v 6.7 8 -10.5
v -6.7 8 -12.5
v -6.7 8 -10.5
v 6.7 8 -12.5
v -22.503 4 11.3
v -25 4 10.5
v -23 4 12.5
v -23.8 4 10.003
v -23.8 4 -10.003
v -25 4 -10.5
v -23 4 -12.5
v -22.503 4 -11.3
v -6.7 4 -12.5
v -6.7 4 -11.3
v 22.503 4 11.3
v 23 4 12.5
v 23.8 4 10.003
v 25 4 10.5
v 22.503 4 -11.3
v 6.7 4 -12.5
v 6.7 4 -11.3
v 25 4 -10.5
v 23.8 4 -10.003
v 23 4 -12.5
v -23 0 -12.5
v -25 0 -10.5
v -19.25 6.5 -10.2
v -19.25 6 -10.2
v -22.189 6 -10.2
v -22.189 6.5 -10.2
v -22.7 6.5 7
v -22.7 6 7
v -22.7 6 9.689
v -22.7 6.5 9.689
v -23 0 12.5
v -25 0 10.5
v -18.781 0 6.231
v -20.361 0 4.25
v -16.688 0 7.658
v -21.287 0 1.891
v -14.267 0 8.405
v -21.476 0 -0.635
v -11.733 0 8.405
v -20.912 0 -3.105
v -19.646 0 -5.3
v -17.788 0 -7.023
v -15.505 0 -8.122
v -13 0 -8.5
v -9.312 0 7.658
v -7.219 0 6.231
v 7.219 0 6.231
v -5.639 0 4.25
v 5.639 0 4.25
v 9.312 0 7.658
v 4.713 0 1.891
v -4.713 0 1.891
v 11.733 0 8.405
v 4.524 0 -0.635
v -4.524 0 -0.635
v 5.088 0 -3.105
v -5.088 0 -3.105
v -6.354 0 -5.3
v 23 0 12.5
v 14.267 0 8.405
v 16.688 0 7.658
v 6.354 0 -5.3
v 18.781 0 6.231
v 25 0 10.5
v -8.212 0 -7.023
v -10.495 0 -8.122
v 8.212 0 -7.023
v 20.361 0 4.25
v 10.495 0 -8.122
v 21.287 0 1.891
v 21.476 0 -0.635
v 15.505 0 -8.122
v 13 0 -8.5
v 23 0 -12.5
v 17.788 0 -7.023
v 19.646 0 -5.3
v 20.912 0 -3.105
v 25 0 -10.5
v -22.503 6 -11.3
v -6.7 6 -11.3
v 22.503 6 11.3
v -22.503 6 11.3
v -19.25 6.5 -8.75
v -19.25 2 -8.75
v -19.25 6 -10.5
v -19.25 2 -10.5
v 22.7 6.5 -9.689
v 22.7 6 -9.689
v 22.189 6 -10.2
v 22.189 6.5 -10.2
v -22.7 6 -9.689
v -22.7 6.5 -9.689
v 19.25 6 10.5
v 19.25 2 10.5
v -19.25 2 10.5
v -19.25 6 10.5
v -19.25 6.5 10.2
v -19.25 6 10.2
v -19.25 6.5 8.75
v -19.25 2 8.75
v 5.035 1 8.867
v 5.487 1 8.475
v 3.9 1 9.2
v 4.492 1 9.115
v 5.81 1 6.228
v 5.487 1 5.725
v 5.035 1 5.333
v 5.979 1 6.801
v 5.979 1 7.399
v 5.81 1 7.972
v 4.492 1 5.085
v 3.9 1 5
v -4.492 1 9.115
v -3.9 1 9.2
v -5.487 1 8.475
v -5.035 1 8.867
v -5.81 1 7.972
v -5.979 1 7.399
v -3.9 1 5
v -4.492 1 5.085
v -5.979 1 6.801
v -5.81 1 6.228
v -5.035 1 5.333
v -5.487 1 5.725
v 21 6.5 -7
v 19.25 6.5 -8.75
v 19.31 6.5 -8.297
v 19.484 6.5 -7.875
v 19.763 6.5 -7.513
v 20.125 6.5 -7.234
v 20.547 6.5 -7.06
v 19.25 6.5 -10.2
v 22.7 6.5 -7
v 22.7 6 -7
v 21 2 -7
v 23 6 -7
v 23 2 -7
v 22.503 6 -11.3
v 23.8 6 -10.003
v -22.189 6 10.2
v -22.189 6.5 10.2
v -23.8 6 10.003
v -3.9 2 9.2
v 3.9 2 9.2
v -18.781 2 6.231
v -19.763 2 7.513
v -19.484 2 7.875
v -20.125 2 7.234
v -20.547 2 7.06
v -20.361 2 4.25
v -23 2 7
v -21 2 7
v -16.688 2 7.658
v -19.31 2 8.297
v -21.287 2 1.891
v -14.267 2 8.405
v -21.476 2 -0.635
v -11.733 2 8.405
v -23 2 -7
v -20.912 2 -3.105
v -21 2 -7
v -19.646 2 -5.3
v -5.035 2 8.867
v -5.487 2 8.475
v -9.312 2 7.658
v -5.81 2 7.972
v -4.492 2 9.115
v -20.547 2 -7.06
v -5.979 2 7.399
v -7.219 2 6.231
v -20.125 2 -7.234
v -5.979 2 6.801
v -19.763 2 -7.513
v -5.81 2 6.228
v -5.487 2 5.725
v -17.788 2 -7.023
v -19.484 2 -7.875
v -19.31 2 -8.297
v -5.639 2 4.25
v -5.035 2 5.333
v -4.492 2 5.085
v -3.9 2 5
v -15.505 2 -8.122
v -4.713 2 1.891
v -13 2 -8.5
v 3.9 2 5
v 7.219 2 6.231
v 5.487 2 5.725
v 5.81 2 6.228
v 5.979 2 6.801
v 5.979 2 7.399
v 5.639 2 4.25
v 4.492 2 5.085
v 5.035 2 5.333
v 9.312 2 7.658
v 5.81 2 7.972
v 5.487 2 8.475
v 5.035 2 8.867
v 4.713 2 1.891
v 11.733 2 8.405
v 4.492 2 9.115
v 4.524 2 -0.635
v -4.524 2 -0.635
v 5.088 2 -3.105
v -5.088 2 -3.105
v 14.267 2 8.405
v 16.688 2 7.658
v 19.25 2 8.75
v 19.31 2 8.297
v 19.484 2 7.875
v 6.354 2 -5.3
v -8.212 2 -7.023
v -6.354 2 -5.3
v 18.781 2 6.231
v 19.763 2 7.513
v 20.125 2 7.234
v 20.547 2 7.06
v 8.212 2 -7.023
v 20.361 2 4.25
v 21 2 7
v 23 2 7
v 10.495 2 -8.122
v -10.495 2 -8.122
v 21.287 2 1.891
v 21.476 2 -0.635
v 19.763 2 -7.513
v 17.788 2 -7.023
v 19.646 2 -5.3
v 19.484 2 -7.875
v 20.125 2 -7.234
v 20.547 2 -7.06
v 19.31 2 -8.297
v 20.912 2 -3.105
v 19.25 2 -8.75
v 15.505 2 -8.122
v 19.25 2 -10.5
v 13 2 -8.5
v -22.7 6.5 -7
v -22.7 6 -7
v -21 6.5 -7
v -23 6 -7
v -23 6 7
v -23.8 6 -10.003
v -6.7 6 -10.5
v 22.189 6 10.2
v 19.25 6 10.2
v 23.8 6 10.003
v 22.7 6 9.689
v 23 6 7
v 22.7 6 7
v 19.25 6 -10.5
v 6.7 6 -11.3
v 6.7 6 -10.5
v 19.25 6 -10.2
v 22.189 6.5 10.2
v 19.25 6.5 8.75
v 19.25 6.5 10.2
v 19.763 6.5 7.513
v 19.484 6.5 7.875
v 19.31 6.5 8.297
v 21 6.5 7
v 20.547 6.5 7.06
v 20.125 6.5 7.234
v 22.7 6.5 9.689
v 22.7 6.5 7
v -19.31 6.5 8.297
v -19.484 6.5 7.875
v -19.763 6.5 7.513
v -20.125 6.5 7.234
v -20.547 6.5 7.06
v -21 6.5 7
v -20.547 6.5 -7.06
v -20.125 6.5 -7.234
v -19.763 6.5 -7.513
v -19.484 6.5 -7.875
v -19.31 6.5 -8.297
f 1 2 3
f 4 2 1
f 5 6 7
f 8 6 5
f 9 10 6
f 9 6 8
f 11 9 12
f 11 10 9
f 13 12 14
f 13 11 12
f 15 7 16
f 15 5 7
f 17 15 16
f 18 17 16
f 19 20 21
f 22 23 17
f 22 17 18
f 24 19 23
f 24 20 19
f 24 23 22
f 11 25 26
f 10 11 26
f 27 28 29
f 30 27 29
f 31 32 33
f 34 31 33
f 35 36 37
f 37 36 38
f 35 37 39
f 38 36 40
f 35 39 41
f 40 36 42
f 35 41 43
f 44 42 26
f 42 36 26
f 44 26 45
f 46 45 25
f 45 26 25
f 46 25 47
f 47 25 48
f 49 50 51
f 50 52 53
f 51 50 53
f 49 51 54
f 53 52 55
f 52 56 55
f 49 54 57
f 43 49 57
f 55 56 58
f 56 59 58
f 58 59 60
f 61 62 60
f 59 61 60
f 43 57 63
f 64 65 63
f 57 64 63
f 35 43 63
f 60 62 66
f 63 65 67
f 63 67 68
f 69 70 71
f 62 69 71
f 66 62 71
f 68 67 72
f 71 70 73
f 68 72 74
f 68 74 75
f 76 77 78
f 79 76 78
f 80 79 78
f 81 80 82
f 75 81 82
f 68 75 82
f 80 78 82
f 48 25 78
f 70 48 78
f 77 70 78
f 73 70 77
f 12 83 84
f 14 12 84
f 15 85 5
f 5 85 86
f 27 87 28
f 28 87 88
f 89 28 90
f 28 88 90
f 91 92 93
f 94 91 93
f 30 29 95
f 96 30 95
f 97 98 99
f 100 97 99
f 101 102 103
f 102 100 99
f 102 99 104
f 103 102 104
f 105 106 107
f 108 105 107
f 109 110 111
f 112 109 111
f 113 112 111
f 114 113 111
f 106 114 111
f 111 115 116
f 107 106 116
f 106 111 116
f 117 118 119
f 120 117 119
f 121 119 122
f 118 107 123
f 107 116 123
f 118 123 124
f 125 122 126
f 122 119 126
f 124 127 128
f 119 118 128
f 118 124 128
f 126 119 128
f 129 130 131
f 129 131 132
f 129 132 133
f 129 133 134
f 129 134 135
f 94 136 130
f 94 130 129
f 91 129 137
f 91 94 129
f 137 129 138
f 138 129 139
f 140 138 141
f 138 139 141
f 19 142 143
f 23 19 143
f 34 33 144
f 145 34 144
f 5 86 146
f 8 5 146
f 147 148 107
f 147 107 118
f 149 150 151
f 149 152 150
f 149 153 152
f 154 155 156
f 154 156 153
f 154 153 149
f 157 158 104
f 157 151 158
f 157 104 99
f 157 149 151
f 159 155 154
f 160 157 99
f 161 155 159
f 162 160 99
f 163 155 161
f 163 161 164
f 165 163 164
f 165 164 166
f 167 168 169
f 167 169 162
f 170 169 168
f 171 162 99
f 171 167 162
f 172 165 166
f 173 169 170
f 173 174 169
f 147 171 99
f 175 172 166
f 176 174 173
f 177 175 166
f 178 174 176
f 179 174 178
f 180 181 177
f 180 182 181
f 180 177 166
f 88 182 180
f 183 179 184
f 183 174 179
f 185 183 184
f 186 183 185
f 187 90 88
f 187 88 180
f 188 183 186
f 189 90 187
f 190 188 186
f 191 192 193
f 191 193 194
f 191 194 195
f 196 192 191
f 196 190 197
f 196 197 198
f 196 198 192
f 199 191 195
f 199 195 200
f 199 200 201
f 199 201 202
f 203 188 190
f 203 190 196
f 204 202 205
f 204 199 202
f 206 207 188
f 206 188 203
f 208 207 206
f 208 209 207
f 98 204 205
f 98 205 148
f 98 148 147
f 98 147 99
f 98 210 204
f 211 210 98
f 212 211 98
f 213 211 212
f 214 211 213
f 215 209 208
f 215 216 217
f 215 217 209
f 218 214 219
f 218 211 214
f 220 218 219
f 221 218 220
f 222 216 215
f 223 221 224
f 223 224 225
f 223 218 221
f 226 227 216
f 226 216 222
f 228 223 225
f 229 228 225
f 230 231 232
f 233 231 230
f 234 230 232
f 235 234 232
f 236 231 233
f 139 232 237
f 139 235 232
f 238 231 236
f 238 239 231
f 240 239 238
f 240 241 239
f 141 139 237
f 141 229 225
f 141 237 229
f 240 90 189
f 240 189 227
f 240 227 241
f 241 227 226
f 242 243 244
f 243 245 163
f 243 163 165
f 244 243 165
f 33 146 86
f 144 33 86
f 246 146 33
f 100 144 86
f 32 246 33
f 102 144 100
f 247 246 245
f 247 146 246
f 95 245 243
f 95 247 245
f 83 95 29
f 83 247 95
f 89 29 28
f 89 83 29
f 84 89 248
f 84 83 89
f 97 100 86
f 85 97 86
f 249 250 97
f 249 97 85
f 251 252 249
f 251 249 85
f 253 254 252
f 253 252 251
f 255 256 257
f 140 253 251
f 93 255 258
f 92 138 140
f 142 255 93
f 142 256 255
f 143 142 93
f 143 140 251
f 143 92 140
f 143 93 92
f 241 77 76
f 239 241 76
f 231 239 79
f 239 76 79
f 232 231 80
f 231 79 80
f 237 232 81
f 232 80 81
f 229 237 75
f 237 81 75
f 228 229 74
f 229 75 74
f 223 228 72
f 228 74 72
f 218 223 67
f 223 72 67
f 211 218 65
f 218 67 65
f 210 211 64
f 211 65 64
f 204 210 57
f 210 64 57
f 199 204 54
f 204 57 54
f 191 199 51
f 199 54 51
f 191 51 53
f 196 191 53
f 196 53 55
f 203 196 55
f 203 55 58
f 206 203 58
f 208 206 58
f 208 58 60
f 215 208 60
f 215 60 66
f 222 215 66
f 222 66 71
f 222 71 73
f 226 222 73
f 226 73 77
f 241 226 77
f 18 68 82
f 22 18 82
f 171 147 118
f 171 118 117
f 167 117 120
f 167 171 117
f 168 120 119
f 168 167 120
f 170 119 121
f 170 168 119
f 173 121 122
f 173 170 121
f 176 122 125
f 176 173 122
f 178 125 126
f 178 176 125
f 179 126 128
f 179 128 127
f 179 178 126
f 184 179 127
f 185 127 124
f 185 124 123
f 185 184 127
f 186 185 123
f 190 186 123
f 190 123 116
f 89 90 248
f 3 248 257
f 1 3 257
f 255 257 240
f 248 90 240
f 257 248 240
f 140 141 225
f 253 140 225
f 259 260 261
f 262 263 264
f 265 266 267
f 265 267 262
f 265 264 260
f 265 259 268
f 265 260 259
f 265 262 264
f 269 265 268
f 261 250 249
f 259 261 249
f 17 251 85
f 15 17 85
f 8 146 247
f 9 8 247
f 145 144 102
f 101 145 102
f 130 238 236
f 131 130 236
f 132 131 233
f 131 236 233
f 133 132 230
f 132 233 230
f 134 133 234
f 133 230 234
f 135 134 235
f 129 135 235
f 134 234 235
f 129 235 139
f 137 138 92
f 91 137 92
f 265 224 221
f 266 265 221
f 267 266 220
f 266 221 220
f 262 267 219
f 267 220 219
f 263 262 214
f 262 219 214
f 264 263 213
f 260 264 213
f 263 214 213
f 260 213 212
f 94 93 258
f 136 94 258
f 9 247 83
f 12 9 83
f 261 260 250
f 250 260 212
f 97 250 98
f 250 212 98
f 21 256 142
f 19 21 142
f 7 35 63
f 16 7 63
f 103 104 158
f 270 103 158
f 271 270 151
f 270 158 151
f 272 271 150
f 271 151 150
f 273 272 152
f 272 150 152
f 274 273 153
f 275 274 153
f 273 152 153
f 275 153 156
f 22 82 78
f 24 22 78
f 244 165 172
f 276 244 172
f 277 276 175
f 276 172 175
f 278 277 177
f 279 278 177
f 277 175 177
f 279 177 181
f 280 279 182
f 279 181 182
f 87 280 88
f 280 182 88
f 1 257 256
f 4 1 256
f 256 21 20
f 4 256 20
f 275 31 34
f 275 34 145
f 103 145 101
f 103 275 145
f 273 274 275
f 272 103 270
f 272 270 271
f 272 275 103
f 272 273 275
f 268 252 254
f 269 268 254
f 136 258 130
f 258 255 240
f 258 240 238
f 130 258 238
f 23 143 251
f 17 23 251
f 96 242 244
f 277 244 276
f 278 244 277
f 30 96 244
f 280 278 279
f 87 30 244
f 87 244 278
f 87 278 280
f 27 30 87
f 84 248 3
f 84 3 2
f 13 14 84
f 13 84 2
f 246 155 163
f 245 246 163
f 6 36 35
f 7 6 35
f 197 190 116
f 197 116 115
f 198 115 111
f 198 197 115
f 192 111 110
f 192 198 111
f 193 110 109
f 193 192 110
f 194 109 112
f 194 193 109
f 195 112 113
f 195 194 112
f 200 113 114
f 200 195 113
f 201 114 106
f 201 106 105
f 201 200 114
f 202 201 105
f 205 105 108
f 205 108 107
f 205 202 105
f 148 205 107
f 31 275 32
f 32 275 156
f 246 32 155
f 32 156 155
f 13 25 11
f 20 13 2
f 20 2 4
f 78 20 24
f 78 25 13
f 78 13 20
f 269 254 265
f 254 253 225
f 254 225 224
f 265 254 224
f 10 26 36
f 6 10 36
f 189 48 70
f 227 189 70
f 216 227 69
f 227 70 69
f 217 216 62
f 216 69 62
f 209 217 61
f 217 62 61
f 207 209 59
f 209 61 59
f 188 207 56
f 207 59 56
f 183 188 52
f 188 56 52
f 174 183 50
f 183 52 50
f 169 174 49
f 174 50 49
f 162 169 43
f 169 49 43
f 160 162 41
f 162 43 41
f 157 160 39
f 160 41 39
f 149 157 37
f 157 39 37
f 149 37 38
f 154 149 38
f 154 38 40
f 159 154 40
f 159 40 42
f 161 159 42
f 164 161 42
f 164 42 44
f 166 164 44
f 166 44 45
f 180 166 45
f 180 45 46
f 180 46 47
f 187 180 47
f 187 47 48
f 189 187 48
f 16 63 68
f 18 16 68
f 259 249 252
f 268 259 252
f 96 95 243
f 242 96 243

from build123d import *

# Parameters (mm, degrees)
BOSS_EXTRUDE1_DEPTH = 2
BOSS_EXTRUDE2_DEPTH = 4
BOSS_EXTRUDE3_DEPTH = 4
SKETCH3_R           = 8.5
FORSENSORS_DEPTH    = 5
FORCRYSTAL_DEPTH    = 1
PCBLEDGE_DEPTH      = 0.5
GROOVE_DEPTH        = 2
SKETCH7_W           = 13.4
SKETCH7_H           = 2
BOSS_EXTRUDE5_DEPTH = 2


with BuildPart() as part:
    # Sketch1 → Boss-Extrude1 (new body)
    with BuildSketch(Plane(origin=(0, 0, 0), x_dir=(1, 0, 0), z_dir=(0, 1, 0))):
        Polygon((7, 12.5), (-23, 12.5), (-25, 10.5), (-25, -10.5), (-23, -12.5), (23, -12.5), (25, -10.5), (25, 10.5), (23, 12.5), align=None)
    extrude(amount=BOSS_EXTRUDE1_DEPTH)

    # Sketch2 → Boss-Extrude2 (add)
    with BuildSketch(Plane(origin=(0, 2, 0), x_dir=(1, 0, 0), z_dir=(0, 1, 0))):
        with BuildLine():
            Line((-19.25, 8.75), (-19.25, 10.5))
            Line((-19.25, 10.5), (-22.171572875, 10.5))
            Line((-22.171572875, 10.5), (-23, 9.671572875))
            Line((-23, 9.671572875), (-23, 7))
            Line((-23, 7), (-21, 7))
            ThreePointArc((-21, 7), (-19.762563133, 7.512563133), (-19.25, 8.75))
        make_face()
        with BuildLine():
            Line((22.171572875, 10.5), (19.25, 10.5))
            Line((19.25, 10.5), (19.25, 8.75))
            ThreePointArc((19.25, 8.75), (19.762563133, 7.512563133), (21, 7))
            Line((21, 7), (23, 7))
            Line((23, 7), (23, 9.671572875))
            Line((23, 9.671572875), (22.171572875, 10.5))
        make_face()
        with BuildLine():
            Line((-21, -7), (-23, -7))
            Line((-23, -7), (-23, -9.671572875))
            Line((-23, -9.671572875), (-22.171572875, -10.5))
            Line((-22.171572875, -10.5), (-19.25, -10.5))
            Line((-19.25, -10.5), (-19.25, -8.75))
            ThreePointArc((-19.25, -8.75), (-19.762563133, -7.512563133), (-21, -7))
        make_face()
        with BuildLine():
            Line((23, -9.671572875), (23, -7))
            Line((23, -7), (21, -7))
            ThreePointArc((21, -7), (19.762563133, -7.512563133), (19.25, -8.75))
            Line((19.25, -8.75), (19.25, -10.5))
            Line((19.25, -10.5), (22.171572875, -10.5))
            Line((22.171572875, -10.5), (23, -9.671572875))
        make_face()
    extrude(amount=BOSS_EXTRUDE2_DEPTH)

    # Sketch2<3> → Boss-Extrude3 (add)
    with BuildSketch(Plane(origin=(0, 2, 0), x_dir=(1, 0, 0), z_dir=(0, 1, 0))):
        Polygon((23, 12.5), (7.5, 12.5), (-7.5, 12.5), (-23, 12.5), (-25, 10.5), (-25, -10.5), (-23, -12.5), (0, -12.5), (23, -12.5), (25, -10.5), (25, 10.5), align=None)
        Polygon((-19.25, 10.5), (-1.449649569, 10.5), (1.449649569, 10.5), (19.25, 10.5), (22.171572875, 10.5), (23, 9.671572875), (23, 7), (23, -7), (23, -9.671572875), (22.171572875, -10.5), (19.25, -10.5), (0, -10.5), (-19.25, -10.5), (-22.171572875, -10.5), (-23, -9.671572875), (-23, -7), (-23, 7), (-23, 9.671572875), (-22.171572875, 10.5), align=None, mode=Mode.SUBTRACT)
    extrude(amount=BOSS_EXTRUDE3_DEPTH)

    # Sketch3 → ForSensors (cut)
    with BuildSketch(Plane.XZ):
        with Locations((-13, 0)):
            Circle(SKETCH3_R)
        with Locations((13, 0)):
            Circle(SKETCH3_R)
    extrude(amount=-FORSENSORS_DEPTH, mode=Mode.SUBTRACT)

    # Sketch4 → ForCrystal (cut)
    with BuildSketch(Plane(origin=(0, 2, 0), x_dir=(1, 0, 0), z_dir=(0, 1, 0))):
        with BuildLine():
            Line((3.9, -9.2), (-3.9, -9.2))
            ThreePointArc((-3.9, -9.2), (-6, -7.1), (-3.9, -5))
            Line((-3.9, -5), (3.9, -5))
            ThreePointArc((3.9, -5), (6, -7.1), (3.9, -9.2))
        make_face()
    extrude(amount=-FORCRYSTAL_DEPTH, mode=Mode.SUBTRACT)

    # Sketch5 → PcbLedge (add)
    with BuildSketch(Plane(origin=(0, 6, 0), x_dir=(1, 0, 0), z_dir=(0, 1, 0))):
        with BuildLine():
            ThreePointArc((19.25, 8.75), (19.762563133, 7.512563133), (21, 7))
            Line((21, 7), (22.7, 7))
            Line((22.7, 7), (22.7, 9.688730163))
            Line((22.7, 9.688730163), (22.188730163, 10.2))
            Line((22.188730163, 10.2), (19.25, 10.2))
            Line((19.25, 10.2), (19.25, 8.75))
        make_face()
        with BuildLine():
            Line((22.7, -7), (21, -7))
            ThreePointArc((21, -7), (19.762563133, -7.512563133), (19.25, -8.75))
            Line((19.25, -8.75), (19.25, -10.2))
            Line((19.25, -10.2), (22.188730163, -10.2))
            Line((22.188730163, -10.2), (22.7, -9.688730163))
            Line((22.7, -9.688730163), (22.7, -7))
        make_face()
        with BuildLine():
            ThreePointArc((-21, 7), (-19.762563133, 7.512563133), (-19.25, 8.75))
            Line((-19.25, 8.75), (-19.25, 10.2))
            Line((-19.25, 10.2), (-22.188730163, 10.2))
            Line((-22.188730163, 10.2), (-22.7, 9.688730163))
            Line((-22.7, 9.688730163), (-22.7, 7))
            Line((-22.7, 7), (-21, 7))
        make_face()
        with BuildLine():
            Line((-19.25, -10.2), (-19.25, -8.75))
            ThreePointArc((-19.25, -8.75), (-19.762563133, -7.512563133), (-21, -7))
            Line((-21, -7), (-22.7, -7))
            Line((-22.7, -7), (-22.7, -9.688730163))
            Line((-22.7, -9.688730163), (-22.188730163, -10.2))
            Line((-22.188730163, -10.2), (-19.25, -10.2))
        make_face()
    extrude(amount=PCBLEDGE_DEPTH)

    # Sketch6 → Groove (cut)
    with BuildSketch(Plane(origin=(0, 6, 0), x_dir=(1, 0, 0), z_dir=(0, 1, 0))):
        Polygon((25, 10.5), (23, 12.5), (6.7, 12.5), (6.7, 11.3), (22.502943725, 11.3), (23.8, 10.002943725), (23.8, -10.002943725), (22.502943725, -11.3), (-22.502943725, -11.3), (-23.8, -10.002943725), (-23.8, 10.002943725), (-22.502943725, 11.3), (-6.7, 11.3), (-6.7, 12.5), (-23, 12.5), (-25, 10.5), (-25, -10.5), (-23, -12.5), (23, -12.5), (25, -10.5), align=None)
    extrude(amount=-GROOVE_DEPTH, mode=Mode.SUBTRACT)

    # Sketch7 → Boss-Extrude5 (add)
    with BuildSketch(Plane(origin=(0, 6, 0), x_dir=(1, 0, 0), z_dir=(0, 1, 0))):
        with Locations((0, 11.5)):
            Rectangle(SKETCH7_W, SKETCH7_H)
    extrude(amount=BOSS_EXTRUDE5_DEPTH)


solid = part.part
